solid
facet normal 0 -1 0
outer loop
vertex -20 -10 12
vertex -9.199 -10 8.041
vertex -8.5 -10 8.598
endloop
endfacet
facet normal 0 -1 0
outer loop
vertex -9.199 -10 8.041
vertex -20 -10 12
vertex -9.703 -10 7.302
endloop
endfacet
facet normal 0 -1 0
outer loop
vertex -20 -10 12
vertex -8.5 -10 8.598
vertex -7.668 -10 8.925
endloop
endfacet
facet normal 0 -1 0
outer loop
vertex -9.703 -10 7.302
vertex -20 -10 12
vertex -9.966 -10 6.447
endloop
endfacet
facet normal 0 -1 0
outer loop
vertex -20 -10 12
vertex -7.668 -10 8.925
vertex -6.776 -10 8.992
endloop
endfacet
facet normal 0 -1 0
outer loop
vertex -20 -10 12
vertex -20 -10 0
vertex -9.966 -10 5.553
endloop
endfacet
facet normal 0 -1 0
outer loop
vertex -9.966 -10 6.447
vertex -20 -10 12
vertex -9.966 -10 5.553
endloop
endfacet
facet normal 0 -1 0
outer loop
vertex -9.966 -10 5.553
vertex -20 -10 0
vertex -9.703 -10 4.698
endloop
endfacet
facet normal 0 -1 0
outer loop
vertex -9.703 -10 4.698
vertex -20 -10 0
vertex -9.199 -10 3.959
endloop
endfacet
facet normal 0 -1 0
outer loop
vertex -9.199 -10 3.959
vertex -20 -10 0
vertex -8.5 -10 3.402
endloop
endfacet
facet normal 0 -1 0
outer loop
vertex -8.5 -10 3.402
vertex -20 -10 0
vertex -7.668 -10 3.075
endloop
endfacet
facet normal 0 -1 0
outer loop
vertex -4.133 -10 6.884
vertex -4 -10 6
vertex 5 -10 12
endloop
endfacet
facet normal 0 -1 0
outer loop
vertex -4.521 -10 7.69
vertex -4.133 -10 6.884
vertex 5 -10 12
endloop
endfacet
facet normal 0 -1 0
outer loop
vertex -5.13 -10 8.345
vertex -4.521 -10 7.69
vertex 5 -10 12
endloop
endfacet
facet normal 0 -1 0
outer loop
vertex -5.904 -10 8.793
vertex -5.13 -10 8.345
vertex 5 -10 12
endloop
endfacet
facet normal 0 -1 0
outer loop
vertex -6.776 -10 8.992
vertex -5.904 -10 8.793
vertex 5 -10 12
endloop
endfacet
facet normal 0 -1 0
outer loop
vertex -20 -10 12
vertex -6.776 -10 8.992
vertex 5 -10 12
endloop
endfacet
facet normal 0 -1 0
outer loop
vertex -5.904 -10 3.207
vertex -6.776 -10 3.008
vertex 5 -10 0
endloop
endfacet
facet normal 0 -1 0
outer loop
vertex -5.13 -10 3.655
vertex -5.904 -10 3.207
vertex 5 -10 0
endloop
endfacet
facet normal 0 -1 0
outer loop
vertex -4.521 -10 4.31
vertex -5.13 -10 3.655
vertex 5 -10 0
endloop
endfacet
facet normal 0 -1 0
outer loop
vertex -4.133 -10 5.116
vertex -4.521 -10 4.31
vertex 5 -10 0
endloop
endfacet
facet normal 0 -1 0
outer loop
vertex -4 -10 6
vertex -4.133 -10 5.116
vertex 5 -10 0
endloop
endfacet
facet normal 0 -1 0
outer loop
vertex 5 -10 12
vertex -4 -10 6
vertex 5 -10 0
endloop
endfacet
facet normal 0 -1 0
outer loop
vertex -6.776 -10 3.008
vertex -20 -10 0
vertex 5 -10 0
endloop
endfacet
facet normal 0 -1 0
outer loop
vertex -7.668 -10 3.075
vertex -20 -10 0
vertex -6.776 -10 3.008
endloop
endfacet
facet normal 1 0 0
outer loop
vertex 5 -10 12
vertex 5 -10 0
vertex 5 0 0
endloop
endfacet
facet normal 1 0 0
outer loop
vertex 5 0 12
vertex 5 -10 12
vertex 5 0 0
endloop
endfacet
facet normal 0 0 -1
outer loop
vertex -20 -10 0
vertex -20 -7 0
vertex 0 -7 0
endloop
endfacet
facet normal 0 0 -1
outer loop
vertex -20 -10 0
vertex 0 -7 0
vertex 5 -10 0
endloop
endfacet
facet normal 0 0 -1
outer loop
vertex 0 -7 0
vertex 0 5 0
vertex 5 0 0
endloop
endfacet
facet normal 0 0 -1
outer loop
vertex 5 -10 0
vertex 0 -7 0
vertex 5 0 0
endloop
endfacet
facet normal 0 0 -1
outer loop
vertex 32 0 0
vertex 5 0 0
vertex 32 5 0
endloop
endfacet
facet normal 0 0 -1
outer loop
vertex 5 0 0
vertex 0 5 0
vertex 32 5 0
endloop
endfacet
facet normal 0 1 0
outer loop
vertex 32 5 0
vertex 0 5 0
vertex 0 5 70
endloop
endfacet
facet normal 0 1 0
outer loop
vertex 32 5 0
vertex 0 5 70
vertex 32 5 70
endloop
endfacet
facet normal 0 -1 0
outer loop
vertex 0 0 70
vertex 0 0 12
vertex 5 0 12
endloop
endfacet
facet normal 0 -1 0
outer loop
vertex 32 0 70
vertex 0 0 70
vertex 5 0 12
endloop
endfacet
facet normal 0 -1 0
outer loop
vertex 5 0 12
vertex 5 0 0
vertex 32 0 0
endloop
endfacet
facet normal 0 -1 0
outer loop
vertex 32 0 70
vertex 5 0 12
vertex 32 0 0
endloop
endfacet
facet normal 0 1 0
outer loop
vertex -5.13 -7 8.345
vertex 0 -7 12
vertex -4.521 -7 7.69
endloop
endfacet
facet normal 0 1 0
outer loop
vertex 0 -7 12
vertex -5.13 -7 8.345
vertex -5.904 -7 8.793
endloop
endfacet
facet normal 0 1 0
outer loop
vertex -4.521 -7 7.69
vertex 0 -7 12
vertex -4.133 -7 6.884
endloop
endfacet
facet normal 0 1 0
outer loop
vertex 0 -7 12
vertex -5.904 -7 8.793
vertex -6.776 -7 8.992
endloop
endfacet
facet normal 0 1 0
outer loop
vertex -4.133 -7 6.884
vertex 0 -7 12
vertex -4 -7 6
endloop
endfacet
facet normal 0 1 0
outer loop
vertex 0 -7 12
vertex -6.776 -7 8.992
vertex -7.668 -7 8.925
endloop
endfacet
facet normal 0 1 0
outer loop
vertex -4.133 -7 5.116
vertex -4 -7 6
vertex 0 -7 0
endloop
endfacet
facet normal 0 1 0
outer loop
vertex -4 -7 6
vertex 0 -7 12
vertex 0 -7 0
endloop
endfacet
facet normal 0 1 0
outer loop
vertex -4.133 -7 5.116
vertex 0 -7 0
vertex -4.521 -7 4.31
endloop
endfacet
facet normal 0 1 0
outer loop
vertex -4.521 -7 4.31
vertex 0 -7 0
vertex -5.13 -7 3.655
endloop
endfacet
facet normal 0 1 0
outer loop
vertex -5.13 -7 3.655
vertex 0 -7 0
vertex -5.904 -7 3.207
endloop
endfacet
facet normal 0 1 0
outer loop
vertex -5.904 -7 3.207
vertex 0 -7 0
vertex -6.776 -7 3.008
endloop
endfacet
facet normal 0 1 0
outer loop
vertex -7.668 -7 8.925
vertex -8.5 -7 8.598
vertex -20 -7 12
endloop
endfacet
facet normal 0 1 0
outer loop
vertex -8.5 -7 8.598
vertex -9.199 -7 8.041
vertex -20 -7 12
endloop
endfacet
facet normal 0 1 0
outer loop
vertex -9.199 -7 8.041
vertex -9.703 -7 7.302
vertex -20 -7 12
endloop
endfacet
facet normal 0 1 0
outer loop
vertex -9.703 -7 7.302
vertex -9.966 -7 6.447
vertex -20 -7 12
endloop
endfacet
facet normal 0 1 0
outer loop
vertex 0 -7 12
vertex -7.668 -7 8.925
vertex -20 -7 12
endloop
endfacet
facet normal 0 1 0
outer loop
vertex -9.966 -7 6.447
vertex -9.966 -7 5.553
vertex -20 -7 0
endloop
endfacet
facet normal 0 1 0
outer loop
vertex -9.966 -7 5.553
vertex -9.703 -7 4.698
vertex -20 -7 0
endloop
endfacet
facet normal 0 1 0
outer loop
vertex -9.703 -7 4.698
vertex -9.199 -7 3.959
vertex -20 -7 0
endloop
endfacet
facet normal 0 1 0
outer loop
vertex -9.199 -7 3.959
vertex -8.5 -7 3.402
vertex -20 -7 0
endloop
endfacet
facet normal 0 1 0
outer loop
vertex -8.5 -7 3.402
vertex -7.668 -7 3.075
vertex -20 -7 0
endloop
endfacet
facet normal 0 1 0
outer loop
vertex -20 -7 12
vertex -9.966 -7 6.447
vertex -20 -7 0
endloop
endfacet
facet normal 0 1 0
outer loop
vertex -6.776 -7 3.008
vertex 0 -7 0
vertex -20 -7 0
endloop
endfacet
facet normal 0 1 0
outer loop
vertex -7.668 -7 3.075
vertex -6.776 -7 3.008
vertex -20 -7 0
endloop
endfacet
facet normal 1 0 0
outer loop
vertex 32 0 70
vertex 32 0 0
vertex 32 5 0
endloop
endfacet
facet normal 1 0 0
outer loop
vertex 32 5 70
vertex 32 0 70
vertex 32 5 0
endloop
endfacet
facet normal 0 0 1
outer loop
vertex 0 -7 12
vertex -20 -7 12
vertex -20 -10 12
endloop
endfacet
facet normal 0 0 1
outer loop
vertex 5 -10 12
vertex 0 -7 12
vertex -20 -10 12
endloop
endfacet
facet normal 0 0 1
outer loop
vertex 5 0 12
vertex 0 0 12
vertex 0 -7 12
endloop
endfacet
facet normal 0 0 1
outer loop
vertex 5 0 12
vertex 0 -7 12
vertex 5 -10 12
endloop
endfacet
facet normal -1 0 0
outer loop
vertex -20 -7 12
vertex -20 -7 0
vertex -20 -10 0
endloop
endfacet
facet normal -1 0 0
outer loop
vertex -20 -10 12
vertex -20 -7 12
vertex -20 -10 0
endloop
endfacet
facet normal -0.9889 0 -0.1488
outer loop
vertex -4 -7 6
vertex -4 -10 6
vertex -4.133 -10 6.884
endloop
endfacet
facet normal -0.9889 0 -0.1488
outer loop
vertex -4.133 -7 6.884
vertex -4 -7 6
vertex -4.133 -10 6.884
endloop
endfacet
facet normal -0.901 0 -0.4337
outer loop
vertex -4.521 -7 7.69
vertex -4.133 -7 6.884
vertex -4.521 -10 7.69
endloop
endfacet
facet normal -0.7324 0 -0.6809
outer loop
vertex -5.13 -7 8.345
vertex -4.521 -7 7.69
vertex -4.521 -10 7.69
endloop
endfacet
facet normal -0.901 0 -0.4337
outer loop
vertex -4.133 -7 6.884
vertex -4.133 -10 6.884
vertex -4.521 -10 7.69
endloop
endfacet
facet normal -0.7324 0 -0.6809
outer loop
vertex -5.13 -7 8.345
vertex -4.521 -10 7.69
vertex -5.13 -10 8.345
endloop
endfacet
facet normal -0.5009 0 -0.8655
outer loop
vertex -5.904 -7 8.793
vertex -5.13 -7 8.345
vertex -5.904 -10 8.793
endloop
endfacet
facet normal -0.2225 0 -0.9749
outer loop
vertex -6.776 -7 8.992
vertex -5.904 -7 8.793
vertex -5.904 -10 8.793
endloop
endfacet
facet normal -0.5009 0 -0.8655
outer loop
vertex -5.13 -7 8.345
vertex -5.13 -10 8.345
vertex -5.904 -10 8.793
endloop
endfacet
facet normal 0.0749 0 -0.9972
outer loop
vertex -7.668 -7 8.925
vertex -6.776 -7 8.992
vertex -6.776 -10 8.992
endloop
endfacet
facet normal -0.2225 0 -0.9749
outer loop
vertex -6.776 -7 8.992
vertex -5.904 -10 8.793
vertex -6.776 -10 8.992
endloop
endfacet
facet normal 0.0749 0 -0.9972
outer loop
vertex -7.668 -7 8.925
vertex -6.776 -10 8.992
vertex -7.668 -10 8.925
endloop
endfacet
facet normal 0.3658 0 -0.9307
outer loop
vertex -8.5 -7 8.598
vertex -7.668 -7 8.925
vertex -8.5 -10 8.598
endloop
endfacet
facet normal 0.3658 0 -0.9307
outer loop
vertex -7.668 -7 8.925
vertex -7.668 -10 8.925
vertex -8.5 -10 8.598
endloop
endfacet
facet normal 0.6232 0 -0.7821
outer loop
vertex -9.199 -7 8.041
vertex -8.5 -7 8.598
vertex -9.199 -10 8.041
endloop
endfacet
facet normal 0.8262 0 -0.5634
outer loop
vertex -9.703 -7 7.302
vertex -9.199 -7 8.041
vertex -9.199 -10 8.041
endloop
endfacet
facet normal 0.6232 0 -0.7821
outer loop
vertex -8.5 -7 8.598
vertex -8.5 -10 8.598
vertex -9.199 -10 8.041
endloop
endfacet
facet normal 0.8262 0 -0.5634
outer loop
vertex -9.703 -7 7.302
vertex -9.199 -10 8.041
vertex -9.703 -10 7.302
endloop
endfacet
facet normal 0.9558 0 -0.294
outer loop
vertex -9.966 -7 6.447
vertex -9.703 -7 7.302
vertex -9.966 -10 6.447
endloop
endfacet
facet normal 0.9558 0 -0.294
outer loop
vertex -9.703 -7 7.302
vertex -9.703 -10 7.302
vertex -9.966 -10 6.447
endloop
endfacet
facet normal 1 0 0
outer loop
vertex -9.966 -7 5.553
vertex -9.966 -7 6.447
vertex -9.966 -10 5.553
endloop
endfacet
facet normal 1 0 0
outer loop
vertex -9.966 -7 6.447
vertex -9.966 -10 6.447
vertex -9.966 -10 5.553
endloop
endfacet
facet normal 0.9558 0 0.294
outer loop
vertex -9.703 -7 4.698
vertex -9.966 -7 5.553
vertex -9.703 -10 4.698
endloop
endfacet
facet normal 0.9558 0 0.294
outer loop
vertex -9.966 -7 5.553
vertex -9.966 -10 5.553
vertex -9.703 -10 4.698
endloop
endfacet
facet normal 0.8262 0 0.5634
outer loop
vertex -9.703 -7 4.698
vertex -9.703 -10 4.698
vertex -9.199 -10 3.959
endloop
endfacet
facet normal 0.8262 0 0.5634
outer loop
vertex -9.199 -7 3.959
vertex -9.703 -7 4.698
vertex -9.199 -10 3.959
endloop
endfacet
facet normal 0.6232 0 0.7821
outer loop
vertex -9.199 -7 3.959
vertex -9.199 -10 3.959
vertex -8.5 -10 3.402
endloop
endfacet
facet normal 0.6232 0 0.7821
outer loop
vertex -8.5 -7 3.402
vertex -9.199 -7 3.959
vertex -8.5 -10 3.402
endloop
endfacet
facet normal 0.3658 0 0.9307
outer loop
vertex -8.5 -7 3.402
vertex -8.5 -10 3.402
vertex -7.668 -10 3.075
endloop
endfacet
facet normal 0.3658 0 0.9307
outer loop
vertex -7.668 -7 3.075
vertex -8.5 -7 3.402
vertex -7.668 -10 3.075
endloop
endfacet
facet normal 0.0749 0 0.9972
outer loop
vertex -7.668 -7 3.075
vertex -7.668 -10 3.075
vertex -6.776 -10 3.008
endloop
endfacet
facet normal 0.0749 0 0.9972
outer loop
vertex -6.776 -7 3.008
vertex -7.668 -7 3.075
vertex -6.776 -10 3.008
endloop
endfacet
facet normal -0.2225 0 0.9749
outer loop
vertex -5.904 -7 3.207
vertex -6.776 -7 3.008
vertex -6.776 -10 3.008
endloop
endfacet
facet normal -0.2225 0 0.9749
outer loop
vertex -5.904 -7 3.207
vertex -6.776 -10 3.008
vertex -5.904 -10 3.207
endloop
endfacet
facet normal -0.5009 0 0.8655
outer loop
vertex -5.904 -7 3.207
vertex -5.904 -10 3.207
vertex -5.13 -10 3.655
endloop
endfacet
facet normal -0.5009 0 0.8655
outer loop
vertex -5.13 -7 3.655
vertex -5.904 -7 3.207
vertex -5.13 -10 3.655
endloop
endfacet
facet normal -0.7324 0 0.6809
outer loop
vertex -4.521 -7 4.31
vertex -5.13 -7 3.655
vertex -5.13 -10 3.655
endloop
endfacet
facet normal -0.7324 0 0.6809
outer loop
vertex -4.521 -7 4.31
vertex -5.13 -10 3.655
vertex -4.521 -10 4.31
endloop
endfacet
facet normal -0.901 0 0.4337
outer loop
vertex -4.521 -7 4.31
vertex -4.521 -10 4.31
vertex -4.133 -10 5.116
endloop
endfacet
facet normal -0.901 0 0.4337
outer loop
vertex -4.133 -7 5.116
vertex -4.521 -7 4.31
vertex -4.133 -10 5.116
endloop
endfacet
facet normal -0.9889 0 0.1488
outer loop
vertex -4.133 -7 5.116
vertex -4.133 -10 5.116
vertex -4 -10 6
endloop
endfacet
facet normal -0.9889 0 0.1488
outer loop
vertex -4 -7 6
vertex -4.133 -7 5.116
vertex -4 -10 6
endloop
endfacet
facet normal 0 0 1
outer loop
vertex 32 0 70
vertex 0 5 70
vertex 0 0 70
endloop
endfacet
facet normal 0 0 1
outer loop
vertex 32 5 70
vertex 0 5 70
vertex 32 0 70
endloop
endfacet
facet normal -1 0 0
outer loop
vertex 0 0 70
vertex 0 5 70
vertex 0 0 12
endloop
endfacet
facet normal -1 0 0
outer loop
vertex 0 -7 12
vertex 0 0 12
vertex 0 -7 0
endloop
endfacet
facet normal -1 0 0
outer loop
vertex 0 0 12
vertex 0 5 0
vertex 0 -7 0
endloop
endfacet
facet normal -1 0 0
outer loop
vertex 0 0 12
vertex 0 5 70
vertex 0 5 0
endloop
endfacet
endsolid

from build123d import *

# Parameters (mm, degrees)
SKETCH_W     = 32
SKETCH_H     = 5
PAD_DEPTH    = 12
SKETCH001_R  = 3
HOLE_DEPTH   = 15.001
SKETCH002_W  = 32
SKETCH002_H  = 5
PAD001_DEPTH = 70


with BuildPart() as part:
    # Sketch → Pad (new body)
    with BuildSketch(Plane.XY):
        Polygon((-20, -10), (5, -10), (5, 0), (0, 0), (0, -7), (-20, -7), align=None)
        with Locations((16, 2.5)):
            Rectangle(SKETCH_W, SKETCH_H)
    extrude(amount=PAD_DEPTH)

    # Sketch001 (on Face1 of Pad) → Hole (cut, through all)
    with BuildSketch(Plane.XZ.offset(10)):
        with Locations((-7, 6)):
            Circle(SKETCH001_R)
    extrude(amount=-HOLE_DEPTH, mode=Mode.SUBTRACT)

    # Sketch002 → Pad001 (join)
    with BuildSketch(Plane.XY):
        with Locations((16, 2.5)):
            Rectangle(SKETCH002_W, SKETCH002_H)
    extrude(amount=PAD001_DEPTH)


solid = part.part
